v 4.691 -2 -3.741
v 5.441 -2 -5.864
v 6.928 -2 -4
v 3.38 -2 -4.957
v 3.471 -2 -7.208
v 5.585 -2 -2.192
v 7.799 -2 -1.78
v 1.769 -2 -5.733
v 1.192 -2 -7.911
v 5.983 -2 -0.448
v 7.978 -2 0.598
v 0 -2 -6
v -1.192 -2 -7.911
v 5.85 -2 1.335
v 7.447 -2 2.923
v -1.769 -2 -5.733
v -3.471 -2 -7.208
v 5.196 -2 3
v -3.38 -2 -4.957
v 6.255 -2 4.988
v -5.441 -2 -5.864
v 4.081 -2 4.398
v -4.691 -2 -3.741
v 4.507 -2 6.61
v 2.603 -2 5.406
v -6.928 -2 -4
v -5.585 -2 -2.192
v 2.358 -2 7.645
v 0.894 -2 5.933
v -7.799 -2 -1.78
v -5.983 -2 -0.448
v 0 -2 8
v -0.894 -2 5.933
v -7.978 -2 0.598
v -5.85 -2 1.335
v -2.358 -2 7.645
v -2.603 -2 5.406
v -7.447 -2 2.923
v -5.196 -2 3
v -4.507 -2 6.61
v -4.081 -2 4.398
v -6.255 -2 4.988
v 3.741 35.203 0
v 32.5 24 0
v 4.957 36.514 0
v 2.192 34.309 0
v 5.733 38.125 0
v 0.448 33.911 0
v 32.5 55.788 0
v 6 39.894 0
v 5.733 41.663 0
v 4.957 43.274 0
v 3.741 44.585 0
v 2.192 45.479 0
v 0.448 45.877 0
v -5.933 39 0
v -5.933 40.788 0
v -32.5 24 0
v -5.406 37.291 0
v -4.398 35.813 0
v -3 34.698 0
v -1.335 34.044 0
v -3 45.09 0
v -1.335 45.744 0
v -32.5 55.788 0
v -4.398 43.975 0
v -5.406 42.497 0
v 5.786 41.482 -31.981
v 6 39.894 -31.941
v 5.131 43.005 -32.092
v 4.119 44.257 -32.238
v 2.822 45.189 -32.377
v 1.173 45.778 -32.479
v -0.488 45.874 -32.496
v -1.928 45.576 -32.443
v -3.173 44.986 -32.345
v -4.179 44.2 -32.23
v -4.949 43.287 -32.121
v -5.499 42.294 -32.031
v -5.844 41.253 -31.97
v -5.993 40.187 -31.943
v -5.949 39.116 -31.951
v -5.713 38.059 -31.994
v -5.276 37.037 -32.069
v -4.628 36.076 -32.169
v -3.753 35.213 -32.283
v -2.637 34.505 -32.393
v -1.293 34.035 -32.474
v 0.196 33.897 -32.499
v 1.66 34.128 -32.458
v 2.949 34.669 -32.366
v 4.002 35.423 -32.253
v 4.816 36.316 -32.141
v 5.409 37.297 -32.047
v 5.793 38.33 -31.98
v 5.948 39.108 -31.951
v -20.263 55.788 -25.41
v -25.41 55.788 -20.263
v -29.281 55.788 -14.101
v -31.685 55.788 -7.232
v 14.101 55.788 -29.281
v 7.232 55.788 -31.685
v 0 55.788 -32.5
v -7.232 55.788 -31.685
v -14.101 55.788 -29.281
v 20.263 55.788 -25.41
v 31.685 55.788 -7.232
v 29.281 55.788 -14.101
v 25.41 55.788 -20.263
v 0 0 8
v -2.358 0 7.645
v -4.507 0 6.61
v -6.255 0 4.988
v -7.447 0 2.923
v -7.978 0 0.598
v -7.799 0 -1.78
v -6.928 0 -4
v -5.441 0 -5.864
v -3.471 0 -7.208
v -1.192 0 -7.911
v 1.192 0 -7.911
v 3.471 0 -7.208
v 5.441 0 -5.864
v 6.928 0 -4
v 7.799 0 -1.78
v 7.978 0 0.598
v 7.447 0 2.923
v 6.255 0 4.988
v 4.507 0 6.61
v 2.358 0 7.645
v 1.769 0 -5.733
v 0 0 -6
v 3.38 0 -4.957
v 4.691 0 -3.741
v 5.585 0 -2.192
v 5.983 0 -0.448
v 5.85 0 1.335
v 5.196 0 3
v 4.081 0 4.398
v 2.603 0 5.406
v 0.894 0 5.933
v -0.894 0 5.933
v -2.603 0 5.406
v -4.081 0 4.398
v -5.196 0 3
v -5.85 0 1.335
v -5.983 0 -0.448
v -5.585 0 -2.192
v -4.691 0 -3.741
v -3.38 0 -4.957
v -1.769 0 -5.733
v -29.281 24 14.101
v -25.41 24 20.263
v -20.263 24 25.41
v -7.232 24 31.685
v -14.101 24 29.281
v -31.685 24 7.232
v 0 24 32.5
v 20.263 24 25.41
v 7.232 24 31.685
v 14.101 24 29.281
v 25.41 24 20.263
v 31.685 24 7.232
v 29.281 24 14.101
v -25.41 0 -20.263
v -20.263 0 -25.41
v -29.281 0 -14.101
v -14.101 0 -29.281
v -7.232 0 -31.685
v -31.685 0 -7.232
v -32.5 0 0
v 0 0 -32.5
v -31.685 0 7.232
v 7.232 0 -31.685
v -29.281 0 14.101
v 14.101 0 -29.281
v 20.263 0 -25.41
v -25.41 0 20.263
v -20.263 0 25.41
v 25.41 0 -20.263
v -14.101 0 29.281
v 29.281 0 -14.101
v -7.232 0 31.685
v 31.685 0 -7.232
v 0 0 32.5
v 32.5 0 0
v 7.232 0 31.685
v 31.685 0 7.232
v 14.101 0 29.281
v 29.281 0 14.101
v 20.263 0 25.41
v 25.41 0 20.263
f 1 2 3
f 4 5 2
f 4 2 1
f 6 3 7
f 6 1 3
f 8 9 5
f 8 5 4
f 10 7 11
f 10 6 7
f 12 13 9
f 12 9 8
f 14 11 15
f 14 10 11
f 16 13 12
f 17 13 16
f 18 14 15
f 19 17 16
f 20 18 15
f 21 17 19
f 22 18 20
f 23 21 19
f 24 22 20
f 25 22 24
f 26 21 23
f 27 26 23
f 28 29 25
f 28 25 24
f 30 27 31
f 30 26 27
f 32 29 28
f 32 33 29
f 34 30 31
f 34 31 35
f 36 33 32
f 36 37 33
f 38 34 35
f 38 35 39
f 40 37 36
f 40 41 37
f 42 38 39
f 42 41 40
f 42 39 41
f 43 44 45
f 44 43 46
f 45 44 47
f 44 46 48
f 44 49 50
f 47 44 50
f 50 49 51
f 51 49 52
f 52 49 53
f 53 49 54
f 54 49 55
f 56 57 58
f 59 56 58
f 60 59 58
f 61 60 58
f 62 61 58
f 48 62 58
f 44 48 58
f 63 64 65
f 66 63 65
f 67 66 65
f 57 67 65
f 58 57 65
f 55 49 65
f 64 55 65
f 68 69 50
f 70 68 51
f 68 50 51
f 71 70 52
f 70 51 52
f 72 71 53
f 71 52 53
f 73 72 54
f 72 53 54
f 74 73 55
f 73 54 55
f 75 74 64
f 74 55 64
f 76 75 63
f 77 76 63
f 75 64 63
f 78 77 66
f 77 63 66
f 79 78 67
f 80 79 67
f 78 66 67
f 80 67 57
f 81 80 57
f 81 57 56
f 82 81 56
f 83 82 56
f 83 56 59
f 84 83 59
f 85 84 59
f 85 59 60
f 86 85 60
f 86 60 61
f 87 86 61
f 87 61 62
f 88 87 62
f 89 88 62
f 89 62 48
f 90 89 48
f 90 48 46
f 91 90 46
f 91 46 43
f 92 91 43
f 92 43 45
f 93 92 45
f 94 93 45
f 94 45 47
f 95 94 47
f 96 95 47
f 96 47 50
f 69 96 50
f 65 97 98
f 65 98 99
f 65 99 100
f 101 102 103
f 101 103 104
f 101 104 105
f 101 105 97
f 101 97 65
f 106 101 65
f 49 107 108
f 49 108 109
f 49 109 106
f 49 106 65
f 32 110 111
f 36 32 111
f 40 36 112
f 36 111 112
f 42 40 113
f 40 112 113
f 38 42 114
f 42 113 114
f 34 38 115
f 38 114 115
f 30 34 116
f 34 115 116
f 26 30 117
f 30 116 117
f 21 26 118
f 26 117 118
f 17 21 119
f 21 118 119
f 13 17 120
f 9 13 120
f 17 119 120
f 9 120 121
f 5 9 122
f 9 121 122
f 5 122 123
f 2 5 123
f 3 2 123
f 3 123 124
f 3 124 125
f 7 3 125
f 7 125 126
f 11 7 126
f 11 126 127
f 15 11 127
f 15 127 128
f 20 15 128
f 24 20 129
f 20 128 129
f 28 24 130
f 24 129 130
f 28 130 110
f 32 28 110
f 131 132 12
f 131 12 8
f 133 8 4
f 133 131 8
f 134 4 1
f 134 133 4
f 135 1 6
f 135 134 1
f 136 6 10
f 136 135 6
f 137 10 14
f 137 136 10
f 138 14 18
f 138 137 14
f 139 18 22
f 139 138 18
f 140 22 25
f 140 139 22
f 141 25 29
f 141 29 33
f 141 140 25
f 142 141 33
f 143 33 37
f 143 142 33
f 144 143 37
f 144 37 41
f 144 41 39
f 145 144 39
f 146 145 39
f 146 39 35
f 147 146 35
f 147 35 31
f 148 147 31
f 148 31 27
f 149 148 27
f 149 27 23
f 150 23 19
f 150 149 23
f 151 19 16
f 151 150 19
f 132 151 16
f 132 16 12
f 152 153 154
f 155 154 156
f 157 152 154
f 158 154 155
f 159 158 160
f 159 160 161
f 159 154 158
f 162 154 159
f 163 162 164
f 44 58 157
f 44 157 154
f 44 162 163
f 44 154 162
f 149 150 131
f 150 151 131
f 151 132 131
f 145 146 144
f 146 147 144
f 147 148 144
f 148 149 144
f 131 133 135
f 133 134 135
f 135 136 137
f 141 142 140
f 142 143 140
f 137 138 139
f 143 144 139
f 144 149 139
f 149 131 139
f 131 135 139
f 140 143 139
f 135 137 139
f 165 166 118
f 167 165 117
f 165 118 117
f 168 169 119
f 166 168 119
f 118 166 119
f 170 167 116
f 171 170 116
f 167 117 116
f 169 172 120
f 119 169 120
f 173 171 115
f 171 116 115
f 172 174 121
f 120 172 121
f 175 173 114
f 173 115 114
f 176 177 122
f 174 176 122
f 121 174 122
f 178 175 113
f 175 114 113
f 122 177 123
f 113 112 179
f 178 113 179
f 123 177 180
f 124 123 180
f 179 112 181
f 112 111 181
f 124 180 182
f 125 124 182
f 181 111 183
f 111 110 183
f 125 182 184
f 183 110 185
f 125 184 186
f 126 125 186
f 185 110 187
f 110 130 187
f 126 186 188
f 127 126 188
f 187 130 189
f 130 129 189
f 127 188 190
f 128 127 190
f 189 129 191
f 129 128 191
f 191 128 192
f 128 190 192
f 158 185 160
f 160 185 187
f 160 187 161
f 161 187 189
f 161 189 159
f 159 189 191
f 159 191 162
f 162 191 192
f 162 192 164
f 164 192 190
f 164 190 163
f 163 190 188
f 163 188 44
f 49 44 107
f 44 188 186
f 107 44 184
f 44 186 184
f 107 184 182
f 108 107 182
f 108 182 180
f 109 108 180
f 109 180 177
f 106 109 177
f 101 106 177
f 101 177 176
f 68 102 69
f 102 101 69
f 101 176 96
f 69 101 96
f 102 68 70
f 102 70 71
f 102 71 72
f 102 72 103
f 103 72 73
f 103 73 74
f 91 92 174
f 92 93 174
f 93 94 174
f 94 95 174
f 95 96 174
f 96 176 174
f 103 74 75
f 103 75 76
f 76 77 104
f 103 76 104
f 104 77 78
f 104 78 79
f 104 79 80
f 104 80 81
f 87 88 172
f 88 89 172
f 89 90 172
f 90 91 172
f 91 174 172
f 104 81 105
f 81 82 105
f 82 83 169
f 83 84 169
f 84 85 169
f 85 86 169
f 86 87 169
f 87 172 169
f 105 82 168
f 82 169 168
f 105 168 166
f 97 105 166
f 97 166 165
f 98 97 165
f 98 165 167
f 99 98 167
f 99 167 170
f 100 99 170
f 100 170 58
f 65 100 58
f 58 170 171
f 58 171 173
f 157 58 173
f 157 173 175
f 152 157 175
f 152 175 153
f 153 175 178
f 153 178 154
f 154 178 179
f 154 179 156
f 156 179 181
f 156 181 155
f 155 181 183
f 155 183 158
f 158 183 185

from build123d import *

# Parameters (mm, degrees)
SKETCH1_R           = 32.5
BOSS_EXTRUDE1_DEPTH = 55.788
CUT_EXTRUDE1_DEPTH  = 31.788
SKETCH3_R           = 8
SKETCH3_R_2         = 6
BOSS_EXTRUDE2_DEPTH = 2
SKETCH5_R           = 6
CUT_EXTRUDE3_DEPTH  = 46


with BuildPart() as part:
    # Sketch1 → Boss-Extrude1 (new body)
    with BuildSketch(Plane(origin=(0, 0, 0), x_dir=(1, 0, 0), z_dir=(0, 1, 0))):
        with Locations(Location((0, 0, 0), (0, 0, 270))):
            Circle(SKETCH1_R)
    extrude(amount=BOSS_EXTRUDE1_DEPTH)

    # Sketch2 → Cut-Extrude1 (cut)
    with BuildSketch(Plane(origin=(0, 55.788, 0), x_dir=(1, 0, 0), z_dir=(0, 1, 0))):
        with BuildLine():
            Line((32.5, 0), (-32.5, 0))
            ThreePointArc((-32.5, 0), (0, -32.5), (32.5, 0))
        make_face()
    extrude(amount=-CUT_EXTRUDE1_DEPTH, mode=Mode.SUBTRACT)

    # Sketch3 → Boss-Extrude2 (add)
    with BuildSketch(Plane(origin=(0, 0, 0), x_dir=(-1, 0, 0), z_dir=(0, -1, 0))):
        with Locations(Location((0, 0, 0), (0, 0, 270))):
            Circle(SKETCH3_R)
        with Locations(Location((0, 0, 0), (0, 0, 90))):
            Circle(SKETCH3_R_2, mode=Mode.SUBTRACT)
    extrude(amount=BOSS_EXTRUDE2_DEPTH)

    # Sketch5 → Cut-Extrude3 (cut)
    with BuildSketch(Plane.XY):
        with Locations((0, 39.894)):
            Circle(SKETCH5_R)
    extrude(amount=-CUT_EXTRUDE3_DEPTH, mode=Mode.SUBTRACT)


solid = part.part
